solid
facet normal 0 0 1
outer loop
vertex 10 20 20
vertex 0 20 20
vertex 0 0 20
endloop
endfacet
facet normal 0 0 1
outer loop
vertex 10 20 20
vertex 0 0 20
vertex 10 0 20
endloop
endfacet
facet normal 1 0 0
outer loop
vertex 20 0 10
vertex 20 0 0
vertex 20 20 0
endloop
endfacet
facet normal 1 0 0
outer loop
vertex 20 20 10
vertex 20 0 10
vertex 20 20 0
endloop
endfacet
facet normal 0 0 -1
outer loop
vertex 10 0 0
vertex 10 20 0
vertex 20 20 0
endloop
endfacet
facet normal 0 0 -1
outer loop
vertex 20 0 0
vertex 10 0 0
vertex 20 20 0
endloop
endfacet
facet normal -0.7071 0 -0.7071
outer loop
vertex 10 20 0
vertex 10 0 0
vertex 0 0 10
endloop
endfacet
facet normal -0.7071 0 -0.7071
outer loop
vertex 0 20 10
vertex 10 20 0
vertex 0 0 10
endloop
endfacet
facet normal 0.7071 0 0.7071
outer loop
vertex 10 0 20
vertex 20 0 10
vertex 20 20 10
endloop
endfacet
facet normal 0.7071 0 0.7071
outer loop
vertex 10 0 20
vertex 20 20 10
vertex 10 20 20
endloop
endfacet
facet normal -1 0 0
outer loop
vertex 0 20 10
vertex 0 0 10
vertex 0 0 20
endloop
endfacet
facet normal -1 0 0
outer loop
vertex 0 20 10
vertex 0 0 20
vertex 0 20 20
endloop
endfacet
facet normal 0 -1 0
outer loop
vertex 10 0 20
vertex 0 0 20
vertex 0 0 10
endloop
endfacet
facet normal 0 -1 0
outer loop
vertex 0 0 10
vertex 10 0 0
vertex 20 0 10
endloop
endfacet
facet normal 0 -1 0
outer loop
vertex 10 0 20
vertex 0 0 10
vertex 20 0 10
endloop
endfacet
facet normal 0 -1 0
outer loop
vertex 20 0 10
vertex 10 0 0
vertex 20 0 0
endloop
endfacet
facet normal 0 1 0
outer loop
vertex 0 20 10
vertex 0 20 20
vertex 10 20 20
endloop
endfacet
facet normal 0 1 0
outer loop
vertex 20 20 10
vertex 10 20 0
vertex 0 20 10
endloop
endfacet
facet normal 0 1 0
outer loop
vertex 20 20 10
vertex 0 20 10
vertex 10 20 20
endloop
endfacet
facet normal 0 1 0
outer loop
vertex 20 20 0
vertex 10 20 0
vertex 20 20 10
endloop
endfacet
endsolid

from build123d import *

# Parameters (mm, degrees)
SKETCH1_W           = 20
SKETCH1_H           = 20
BOSS_EXTRUDE1_DEPTH = 20
CUT_EXTRUDE1_DEPTH  = 20
CUT_EXTRUDE2_DEPTH  = 20


with BuildPart() as part:
    # Sketch1 → Boss-Extrude1 (new body)
    with BuildSketch(Plane.XY):
        with Locations((10, 10)):
            Rectangle(SKETCH1_W, SKETCH1_H)
    extrude(amount=BOSS_EXTRUDE1_DEPTH)

    # Sketch2 → Cut-Extrude1 (cut)
    with BuildSketch(Plane(origin=(0, 20, 0), x_dir=(1, 0, 0), z_dir=(0, 1, 0))):
        Polygon((20, -20), (20, -10), (10, -20), align=None)
    extrude(amount=-CUT_EXTRUDE1_DEPTH, mode=Mode.SUBTRACT)

    # Sketch3 → Cut-Extrude2 (cut)
    with BuildSketch(Plane(origin=(0, 20, 0), x_dir=(1, 0, 0), z_dir=(0, 1, 0))):
        Polygon((0, 0), (10, 0), (0, -10), align=None)
    extrude(amount=-CUT_EXTRUDE2_DEPTH, mode=Mode.SUBTRACT)


solid = part.part
